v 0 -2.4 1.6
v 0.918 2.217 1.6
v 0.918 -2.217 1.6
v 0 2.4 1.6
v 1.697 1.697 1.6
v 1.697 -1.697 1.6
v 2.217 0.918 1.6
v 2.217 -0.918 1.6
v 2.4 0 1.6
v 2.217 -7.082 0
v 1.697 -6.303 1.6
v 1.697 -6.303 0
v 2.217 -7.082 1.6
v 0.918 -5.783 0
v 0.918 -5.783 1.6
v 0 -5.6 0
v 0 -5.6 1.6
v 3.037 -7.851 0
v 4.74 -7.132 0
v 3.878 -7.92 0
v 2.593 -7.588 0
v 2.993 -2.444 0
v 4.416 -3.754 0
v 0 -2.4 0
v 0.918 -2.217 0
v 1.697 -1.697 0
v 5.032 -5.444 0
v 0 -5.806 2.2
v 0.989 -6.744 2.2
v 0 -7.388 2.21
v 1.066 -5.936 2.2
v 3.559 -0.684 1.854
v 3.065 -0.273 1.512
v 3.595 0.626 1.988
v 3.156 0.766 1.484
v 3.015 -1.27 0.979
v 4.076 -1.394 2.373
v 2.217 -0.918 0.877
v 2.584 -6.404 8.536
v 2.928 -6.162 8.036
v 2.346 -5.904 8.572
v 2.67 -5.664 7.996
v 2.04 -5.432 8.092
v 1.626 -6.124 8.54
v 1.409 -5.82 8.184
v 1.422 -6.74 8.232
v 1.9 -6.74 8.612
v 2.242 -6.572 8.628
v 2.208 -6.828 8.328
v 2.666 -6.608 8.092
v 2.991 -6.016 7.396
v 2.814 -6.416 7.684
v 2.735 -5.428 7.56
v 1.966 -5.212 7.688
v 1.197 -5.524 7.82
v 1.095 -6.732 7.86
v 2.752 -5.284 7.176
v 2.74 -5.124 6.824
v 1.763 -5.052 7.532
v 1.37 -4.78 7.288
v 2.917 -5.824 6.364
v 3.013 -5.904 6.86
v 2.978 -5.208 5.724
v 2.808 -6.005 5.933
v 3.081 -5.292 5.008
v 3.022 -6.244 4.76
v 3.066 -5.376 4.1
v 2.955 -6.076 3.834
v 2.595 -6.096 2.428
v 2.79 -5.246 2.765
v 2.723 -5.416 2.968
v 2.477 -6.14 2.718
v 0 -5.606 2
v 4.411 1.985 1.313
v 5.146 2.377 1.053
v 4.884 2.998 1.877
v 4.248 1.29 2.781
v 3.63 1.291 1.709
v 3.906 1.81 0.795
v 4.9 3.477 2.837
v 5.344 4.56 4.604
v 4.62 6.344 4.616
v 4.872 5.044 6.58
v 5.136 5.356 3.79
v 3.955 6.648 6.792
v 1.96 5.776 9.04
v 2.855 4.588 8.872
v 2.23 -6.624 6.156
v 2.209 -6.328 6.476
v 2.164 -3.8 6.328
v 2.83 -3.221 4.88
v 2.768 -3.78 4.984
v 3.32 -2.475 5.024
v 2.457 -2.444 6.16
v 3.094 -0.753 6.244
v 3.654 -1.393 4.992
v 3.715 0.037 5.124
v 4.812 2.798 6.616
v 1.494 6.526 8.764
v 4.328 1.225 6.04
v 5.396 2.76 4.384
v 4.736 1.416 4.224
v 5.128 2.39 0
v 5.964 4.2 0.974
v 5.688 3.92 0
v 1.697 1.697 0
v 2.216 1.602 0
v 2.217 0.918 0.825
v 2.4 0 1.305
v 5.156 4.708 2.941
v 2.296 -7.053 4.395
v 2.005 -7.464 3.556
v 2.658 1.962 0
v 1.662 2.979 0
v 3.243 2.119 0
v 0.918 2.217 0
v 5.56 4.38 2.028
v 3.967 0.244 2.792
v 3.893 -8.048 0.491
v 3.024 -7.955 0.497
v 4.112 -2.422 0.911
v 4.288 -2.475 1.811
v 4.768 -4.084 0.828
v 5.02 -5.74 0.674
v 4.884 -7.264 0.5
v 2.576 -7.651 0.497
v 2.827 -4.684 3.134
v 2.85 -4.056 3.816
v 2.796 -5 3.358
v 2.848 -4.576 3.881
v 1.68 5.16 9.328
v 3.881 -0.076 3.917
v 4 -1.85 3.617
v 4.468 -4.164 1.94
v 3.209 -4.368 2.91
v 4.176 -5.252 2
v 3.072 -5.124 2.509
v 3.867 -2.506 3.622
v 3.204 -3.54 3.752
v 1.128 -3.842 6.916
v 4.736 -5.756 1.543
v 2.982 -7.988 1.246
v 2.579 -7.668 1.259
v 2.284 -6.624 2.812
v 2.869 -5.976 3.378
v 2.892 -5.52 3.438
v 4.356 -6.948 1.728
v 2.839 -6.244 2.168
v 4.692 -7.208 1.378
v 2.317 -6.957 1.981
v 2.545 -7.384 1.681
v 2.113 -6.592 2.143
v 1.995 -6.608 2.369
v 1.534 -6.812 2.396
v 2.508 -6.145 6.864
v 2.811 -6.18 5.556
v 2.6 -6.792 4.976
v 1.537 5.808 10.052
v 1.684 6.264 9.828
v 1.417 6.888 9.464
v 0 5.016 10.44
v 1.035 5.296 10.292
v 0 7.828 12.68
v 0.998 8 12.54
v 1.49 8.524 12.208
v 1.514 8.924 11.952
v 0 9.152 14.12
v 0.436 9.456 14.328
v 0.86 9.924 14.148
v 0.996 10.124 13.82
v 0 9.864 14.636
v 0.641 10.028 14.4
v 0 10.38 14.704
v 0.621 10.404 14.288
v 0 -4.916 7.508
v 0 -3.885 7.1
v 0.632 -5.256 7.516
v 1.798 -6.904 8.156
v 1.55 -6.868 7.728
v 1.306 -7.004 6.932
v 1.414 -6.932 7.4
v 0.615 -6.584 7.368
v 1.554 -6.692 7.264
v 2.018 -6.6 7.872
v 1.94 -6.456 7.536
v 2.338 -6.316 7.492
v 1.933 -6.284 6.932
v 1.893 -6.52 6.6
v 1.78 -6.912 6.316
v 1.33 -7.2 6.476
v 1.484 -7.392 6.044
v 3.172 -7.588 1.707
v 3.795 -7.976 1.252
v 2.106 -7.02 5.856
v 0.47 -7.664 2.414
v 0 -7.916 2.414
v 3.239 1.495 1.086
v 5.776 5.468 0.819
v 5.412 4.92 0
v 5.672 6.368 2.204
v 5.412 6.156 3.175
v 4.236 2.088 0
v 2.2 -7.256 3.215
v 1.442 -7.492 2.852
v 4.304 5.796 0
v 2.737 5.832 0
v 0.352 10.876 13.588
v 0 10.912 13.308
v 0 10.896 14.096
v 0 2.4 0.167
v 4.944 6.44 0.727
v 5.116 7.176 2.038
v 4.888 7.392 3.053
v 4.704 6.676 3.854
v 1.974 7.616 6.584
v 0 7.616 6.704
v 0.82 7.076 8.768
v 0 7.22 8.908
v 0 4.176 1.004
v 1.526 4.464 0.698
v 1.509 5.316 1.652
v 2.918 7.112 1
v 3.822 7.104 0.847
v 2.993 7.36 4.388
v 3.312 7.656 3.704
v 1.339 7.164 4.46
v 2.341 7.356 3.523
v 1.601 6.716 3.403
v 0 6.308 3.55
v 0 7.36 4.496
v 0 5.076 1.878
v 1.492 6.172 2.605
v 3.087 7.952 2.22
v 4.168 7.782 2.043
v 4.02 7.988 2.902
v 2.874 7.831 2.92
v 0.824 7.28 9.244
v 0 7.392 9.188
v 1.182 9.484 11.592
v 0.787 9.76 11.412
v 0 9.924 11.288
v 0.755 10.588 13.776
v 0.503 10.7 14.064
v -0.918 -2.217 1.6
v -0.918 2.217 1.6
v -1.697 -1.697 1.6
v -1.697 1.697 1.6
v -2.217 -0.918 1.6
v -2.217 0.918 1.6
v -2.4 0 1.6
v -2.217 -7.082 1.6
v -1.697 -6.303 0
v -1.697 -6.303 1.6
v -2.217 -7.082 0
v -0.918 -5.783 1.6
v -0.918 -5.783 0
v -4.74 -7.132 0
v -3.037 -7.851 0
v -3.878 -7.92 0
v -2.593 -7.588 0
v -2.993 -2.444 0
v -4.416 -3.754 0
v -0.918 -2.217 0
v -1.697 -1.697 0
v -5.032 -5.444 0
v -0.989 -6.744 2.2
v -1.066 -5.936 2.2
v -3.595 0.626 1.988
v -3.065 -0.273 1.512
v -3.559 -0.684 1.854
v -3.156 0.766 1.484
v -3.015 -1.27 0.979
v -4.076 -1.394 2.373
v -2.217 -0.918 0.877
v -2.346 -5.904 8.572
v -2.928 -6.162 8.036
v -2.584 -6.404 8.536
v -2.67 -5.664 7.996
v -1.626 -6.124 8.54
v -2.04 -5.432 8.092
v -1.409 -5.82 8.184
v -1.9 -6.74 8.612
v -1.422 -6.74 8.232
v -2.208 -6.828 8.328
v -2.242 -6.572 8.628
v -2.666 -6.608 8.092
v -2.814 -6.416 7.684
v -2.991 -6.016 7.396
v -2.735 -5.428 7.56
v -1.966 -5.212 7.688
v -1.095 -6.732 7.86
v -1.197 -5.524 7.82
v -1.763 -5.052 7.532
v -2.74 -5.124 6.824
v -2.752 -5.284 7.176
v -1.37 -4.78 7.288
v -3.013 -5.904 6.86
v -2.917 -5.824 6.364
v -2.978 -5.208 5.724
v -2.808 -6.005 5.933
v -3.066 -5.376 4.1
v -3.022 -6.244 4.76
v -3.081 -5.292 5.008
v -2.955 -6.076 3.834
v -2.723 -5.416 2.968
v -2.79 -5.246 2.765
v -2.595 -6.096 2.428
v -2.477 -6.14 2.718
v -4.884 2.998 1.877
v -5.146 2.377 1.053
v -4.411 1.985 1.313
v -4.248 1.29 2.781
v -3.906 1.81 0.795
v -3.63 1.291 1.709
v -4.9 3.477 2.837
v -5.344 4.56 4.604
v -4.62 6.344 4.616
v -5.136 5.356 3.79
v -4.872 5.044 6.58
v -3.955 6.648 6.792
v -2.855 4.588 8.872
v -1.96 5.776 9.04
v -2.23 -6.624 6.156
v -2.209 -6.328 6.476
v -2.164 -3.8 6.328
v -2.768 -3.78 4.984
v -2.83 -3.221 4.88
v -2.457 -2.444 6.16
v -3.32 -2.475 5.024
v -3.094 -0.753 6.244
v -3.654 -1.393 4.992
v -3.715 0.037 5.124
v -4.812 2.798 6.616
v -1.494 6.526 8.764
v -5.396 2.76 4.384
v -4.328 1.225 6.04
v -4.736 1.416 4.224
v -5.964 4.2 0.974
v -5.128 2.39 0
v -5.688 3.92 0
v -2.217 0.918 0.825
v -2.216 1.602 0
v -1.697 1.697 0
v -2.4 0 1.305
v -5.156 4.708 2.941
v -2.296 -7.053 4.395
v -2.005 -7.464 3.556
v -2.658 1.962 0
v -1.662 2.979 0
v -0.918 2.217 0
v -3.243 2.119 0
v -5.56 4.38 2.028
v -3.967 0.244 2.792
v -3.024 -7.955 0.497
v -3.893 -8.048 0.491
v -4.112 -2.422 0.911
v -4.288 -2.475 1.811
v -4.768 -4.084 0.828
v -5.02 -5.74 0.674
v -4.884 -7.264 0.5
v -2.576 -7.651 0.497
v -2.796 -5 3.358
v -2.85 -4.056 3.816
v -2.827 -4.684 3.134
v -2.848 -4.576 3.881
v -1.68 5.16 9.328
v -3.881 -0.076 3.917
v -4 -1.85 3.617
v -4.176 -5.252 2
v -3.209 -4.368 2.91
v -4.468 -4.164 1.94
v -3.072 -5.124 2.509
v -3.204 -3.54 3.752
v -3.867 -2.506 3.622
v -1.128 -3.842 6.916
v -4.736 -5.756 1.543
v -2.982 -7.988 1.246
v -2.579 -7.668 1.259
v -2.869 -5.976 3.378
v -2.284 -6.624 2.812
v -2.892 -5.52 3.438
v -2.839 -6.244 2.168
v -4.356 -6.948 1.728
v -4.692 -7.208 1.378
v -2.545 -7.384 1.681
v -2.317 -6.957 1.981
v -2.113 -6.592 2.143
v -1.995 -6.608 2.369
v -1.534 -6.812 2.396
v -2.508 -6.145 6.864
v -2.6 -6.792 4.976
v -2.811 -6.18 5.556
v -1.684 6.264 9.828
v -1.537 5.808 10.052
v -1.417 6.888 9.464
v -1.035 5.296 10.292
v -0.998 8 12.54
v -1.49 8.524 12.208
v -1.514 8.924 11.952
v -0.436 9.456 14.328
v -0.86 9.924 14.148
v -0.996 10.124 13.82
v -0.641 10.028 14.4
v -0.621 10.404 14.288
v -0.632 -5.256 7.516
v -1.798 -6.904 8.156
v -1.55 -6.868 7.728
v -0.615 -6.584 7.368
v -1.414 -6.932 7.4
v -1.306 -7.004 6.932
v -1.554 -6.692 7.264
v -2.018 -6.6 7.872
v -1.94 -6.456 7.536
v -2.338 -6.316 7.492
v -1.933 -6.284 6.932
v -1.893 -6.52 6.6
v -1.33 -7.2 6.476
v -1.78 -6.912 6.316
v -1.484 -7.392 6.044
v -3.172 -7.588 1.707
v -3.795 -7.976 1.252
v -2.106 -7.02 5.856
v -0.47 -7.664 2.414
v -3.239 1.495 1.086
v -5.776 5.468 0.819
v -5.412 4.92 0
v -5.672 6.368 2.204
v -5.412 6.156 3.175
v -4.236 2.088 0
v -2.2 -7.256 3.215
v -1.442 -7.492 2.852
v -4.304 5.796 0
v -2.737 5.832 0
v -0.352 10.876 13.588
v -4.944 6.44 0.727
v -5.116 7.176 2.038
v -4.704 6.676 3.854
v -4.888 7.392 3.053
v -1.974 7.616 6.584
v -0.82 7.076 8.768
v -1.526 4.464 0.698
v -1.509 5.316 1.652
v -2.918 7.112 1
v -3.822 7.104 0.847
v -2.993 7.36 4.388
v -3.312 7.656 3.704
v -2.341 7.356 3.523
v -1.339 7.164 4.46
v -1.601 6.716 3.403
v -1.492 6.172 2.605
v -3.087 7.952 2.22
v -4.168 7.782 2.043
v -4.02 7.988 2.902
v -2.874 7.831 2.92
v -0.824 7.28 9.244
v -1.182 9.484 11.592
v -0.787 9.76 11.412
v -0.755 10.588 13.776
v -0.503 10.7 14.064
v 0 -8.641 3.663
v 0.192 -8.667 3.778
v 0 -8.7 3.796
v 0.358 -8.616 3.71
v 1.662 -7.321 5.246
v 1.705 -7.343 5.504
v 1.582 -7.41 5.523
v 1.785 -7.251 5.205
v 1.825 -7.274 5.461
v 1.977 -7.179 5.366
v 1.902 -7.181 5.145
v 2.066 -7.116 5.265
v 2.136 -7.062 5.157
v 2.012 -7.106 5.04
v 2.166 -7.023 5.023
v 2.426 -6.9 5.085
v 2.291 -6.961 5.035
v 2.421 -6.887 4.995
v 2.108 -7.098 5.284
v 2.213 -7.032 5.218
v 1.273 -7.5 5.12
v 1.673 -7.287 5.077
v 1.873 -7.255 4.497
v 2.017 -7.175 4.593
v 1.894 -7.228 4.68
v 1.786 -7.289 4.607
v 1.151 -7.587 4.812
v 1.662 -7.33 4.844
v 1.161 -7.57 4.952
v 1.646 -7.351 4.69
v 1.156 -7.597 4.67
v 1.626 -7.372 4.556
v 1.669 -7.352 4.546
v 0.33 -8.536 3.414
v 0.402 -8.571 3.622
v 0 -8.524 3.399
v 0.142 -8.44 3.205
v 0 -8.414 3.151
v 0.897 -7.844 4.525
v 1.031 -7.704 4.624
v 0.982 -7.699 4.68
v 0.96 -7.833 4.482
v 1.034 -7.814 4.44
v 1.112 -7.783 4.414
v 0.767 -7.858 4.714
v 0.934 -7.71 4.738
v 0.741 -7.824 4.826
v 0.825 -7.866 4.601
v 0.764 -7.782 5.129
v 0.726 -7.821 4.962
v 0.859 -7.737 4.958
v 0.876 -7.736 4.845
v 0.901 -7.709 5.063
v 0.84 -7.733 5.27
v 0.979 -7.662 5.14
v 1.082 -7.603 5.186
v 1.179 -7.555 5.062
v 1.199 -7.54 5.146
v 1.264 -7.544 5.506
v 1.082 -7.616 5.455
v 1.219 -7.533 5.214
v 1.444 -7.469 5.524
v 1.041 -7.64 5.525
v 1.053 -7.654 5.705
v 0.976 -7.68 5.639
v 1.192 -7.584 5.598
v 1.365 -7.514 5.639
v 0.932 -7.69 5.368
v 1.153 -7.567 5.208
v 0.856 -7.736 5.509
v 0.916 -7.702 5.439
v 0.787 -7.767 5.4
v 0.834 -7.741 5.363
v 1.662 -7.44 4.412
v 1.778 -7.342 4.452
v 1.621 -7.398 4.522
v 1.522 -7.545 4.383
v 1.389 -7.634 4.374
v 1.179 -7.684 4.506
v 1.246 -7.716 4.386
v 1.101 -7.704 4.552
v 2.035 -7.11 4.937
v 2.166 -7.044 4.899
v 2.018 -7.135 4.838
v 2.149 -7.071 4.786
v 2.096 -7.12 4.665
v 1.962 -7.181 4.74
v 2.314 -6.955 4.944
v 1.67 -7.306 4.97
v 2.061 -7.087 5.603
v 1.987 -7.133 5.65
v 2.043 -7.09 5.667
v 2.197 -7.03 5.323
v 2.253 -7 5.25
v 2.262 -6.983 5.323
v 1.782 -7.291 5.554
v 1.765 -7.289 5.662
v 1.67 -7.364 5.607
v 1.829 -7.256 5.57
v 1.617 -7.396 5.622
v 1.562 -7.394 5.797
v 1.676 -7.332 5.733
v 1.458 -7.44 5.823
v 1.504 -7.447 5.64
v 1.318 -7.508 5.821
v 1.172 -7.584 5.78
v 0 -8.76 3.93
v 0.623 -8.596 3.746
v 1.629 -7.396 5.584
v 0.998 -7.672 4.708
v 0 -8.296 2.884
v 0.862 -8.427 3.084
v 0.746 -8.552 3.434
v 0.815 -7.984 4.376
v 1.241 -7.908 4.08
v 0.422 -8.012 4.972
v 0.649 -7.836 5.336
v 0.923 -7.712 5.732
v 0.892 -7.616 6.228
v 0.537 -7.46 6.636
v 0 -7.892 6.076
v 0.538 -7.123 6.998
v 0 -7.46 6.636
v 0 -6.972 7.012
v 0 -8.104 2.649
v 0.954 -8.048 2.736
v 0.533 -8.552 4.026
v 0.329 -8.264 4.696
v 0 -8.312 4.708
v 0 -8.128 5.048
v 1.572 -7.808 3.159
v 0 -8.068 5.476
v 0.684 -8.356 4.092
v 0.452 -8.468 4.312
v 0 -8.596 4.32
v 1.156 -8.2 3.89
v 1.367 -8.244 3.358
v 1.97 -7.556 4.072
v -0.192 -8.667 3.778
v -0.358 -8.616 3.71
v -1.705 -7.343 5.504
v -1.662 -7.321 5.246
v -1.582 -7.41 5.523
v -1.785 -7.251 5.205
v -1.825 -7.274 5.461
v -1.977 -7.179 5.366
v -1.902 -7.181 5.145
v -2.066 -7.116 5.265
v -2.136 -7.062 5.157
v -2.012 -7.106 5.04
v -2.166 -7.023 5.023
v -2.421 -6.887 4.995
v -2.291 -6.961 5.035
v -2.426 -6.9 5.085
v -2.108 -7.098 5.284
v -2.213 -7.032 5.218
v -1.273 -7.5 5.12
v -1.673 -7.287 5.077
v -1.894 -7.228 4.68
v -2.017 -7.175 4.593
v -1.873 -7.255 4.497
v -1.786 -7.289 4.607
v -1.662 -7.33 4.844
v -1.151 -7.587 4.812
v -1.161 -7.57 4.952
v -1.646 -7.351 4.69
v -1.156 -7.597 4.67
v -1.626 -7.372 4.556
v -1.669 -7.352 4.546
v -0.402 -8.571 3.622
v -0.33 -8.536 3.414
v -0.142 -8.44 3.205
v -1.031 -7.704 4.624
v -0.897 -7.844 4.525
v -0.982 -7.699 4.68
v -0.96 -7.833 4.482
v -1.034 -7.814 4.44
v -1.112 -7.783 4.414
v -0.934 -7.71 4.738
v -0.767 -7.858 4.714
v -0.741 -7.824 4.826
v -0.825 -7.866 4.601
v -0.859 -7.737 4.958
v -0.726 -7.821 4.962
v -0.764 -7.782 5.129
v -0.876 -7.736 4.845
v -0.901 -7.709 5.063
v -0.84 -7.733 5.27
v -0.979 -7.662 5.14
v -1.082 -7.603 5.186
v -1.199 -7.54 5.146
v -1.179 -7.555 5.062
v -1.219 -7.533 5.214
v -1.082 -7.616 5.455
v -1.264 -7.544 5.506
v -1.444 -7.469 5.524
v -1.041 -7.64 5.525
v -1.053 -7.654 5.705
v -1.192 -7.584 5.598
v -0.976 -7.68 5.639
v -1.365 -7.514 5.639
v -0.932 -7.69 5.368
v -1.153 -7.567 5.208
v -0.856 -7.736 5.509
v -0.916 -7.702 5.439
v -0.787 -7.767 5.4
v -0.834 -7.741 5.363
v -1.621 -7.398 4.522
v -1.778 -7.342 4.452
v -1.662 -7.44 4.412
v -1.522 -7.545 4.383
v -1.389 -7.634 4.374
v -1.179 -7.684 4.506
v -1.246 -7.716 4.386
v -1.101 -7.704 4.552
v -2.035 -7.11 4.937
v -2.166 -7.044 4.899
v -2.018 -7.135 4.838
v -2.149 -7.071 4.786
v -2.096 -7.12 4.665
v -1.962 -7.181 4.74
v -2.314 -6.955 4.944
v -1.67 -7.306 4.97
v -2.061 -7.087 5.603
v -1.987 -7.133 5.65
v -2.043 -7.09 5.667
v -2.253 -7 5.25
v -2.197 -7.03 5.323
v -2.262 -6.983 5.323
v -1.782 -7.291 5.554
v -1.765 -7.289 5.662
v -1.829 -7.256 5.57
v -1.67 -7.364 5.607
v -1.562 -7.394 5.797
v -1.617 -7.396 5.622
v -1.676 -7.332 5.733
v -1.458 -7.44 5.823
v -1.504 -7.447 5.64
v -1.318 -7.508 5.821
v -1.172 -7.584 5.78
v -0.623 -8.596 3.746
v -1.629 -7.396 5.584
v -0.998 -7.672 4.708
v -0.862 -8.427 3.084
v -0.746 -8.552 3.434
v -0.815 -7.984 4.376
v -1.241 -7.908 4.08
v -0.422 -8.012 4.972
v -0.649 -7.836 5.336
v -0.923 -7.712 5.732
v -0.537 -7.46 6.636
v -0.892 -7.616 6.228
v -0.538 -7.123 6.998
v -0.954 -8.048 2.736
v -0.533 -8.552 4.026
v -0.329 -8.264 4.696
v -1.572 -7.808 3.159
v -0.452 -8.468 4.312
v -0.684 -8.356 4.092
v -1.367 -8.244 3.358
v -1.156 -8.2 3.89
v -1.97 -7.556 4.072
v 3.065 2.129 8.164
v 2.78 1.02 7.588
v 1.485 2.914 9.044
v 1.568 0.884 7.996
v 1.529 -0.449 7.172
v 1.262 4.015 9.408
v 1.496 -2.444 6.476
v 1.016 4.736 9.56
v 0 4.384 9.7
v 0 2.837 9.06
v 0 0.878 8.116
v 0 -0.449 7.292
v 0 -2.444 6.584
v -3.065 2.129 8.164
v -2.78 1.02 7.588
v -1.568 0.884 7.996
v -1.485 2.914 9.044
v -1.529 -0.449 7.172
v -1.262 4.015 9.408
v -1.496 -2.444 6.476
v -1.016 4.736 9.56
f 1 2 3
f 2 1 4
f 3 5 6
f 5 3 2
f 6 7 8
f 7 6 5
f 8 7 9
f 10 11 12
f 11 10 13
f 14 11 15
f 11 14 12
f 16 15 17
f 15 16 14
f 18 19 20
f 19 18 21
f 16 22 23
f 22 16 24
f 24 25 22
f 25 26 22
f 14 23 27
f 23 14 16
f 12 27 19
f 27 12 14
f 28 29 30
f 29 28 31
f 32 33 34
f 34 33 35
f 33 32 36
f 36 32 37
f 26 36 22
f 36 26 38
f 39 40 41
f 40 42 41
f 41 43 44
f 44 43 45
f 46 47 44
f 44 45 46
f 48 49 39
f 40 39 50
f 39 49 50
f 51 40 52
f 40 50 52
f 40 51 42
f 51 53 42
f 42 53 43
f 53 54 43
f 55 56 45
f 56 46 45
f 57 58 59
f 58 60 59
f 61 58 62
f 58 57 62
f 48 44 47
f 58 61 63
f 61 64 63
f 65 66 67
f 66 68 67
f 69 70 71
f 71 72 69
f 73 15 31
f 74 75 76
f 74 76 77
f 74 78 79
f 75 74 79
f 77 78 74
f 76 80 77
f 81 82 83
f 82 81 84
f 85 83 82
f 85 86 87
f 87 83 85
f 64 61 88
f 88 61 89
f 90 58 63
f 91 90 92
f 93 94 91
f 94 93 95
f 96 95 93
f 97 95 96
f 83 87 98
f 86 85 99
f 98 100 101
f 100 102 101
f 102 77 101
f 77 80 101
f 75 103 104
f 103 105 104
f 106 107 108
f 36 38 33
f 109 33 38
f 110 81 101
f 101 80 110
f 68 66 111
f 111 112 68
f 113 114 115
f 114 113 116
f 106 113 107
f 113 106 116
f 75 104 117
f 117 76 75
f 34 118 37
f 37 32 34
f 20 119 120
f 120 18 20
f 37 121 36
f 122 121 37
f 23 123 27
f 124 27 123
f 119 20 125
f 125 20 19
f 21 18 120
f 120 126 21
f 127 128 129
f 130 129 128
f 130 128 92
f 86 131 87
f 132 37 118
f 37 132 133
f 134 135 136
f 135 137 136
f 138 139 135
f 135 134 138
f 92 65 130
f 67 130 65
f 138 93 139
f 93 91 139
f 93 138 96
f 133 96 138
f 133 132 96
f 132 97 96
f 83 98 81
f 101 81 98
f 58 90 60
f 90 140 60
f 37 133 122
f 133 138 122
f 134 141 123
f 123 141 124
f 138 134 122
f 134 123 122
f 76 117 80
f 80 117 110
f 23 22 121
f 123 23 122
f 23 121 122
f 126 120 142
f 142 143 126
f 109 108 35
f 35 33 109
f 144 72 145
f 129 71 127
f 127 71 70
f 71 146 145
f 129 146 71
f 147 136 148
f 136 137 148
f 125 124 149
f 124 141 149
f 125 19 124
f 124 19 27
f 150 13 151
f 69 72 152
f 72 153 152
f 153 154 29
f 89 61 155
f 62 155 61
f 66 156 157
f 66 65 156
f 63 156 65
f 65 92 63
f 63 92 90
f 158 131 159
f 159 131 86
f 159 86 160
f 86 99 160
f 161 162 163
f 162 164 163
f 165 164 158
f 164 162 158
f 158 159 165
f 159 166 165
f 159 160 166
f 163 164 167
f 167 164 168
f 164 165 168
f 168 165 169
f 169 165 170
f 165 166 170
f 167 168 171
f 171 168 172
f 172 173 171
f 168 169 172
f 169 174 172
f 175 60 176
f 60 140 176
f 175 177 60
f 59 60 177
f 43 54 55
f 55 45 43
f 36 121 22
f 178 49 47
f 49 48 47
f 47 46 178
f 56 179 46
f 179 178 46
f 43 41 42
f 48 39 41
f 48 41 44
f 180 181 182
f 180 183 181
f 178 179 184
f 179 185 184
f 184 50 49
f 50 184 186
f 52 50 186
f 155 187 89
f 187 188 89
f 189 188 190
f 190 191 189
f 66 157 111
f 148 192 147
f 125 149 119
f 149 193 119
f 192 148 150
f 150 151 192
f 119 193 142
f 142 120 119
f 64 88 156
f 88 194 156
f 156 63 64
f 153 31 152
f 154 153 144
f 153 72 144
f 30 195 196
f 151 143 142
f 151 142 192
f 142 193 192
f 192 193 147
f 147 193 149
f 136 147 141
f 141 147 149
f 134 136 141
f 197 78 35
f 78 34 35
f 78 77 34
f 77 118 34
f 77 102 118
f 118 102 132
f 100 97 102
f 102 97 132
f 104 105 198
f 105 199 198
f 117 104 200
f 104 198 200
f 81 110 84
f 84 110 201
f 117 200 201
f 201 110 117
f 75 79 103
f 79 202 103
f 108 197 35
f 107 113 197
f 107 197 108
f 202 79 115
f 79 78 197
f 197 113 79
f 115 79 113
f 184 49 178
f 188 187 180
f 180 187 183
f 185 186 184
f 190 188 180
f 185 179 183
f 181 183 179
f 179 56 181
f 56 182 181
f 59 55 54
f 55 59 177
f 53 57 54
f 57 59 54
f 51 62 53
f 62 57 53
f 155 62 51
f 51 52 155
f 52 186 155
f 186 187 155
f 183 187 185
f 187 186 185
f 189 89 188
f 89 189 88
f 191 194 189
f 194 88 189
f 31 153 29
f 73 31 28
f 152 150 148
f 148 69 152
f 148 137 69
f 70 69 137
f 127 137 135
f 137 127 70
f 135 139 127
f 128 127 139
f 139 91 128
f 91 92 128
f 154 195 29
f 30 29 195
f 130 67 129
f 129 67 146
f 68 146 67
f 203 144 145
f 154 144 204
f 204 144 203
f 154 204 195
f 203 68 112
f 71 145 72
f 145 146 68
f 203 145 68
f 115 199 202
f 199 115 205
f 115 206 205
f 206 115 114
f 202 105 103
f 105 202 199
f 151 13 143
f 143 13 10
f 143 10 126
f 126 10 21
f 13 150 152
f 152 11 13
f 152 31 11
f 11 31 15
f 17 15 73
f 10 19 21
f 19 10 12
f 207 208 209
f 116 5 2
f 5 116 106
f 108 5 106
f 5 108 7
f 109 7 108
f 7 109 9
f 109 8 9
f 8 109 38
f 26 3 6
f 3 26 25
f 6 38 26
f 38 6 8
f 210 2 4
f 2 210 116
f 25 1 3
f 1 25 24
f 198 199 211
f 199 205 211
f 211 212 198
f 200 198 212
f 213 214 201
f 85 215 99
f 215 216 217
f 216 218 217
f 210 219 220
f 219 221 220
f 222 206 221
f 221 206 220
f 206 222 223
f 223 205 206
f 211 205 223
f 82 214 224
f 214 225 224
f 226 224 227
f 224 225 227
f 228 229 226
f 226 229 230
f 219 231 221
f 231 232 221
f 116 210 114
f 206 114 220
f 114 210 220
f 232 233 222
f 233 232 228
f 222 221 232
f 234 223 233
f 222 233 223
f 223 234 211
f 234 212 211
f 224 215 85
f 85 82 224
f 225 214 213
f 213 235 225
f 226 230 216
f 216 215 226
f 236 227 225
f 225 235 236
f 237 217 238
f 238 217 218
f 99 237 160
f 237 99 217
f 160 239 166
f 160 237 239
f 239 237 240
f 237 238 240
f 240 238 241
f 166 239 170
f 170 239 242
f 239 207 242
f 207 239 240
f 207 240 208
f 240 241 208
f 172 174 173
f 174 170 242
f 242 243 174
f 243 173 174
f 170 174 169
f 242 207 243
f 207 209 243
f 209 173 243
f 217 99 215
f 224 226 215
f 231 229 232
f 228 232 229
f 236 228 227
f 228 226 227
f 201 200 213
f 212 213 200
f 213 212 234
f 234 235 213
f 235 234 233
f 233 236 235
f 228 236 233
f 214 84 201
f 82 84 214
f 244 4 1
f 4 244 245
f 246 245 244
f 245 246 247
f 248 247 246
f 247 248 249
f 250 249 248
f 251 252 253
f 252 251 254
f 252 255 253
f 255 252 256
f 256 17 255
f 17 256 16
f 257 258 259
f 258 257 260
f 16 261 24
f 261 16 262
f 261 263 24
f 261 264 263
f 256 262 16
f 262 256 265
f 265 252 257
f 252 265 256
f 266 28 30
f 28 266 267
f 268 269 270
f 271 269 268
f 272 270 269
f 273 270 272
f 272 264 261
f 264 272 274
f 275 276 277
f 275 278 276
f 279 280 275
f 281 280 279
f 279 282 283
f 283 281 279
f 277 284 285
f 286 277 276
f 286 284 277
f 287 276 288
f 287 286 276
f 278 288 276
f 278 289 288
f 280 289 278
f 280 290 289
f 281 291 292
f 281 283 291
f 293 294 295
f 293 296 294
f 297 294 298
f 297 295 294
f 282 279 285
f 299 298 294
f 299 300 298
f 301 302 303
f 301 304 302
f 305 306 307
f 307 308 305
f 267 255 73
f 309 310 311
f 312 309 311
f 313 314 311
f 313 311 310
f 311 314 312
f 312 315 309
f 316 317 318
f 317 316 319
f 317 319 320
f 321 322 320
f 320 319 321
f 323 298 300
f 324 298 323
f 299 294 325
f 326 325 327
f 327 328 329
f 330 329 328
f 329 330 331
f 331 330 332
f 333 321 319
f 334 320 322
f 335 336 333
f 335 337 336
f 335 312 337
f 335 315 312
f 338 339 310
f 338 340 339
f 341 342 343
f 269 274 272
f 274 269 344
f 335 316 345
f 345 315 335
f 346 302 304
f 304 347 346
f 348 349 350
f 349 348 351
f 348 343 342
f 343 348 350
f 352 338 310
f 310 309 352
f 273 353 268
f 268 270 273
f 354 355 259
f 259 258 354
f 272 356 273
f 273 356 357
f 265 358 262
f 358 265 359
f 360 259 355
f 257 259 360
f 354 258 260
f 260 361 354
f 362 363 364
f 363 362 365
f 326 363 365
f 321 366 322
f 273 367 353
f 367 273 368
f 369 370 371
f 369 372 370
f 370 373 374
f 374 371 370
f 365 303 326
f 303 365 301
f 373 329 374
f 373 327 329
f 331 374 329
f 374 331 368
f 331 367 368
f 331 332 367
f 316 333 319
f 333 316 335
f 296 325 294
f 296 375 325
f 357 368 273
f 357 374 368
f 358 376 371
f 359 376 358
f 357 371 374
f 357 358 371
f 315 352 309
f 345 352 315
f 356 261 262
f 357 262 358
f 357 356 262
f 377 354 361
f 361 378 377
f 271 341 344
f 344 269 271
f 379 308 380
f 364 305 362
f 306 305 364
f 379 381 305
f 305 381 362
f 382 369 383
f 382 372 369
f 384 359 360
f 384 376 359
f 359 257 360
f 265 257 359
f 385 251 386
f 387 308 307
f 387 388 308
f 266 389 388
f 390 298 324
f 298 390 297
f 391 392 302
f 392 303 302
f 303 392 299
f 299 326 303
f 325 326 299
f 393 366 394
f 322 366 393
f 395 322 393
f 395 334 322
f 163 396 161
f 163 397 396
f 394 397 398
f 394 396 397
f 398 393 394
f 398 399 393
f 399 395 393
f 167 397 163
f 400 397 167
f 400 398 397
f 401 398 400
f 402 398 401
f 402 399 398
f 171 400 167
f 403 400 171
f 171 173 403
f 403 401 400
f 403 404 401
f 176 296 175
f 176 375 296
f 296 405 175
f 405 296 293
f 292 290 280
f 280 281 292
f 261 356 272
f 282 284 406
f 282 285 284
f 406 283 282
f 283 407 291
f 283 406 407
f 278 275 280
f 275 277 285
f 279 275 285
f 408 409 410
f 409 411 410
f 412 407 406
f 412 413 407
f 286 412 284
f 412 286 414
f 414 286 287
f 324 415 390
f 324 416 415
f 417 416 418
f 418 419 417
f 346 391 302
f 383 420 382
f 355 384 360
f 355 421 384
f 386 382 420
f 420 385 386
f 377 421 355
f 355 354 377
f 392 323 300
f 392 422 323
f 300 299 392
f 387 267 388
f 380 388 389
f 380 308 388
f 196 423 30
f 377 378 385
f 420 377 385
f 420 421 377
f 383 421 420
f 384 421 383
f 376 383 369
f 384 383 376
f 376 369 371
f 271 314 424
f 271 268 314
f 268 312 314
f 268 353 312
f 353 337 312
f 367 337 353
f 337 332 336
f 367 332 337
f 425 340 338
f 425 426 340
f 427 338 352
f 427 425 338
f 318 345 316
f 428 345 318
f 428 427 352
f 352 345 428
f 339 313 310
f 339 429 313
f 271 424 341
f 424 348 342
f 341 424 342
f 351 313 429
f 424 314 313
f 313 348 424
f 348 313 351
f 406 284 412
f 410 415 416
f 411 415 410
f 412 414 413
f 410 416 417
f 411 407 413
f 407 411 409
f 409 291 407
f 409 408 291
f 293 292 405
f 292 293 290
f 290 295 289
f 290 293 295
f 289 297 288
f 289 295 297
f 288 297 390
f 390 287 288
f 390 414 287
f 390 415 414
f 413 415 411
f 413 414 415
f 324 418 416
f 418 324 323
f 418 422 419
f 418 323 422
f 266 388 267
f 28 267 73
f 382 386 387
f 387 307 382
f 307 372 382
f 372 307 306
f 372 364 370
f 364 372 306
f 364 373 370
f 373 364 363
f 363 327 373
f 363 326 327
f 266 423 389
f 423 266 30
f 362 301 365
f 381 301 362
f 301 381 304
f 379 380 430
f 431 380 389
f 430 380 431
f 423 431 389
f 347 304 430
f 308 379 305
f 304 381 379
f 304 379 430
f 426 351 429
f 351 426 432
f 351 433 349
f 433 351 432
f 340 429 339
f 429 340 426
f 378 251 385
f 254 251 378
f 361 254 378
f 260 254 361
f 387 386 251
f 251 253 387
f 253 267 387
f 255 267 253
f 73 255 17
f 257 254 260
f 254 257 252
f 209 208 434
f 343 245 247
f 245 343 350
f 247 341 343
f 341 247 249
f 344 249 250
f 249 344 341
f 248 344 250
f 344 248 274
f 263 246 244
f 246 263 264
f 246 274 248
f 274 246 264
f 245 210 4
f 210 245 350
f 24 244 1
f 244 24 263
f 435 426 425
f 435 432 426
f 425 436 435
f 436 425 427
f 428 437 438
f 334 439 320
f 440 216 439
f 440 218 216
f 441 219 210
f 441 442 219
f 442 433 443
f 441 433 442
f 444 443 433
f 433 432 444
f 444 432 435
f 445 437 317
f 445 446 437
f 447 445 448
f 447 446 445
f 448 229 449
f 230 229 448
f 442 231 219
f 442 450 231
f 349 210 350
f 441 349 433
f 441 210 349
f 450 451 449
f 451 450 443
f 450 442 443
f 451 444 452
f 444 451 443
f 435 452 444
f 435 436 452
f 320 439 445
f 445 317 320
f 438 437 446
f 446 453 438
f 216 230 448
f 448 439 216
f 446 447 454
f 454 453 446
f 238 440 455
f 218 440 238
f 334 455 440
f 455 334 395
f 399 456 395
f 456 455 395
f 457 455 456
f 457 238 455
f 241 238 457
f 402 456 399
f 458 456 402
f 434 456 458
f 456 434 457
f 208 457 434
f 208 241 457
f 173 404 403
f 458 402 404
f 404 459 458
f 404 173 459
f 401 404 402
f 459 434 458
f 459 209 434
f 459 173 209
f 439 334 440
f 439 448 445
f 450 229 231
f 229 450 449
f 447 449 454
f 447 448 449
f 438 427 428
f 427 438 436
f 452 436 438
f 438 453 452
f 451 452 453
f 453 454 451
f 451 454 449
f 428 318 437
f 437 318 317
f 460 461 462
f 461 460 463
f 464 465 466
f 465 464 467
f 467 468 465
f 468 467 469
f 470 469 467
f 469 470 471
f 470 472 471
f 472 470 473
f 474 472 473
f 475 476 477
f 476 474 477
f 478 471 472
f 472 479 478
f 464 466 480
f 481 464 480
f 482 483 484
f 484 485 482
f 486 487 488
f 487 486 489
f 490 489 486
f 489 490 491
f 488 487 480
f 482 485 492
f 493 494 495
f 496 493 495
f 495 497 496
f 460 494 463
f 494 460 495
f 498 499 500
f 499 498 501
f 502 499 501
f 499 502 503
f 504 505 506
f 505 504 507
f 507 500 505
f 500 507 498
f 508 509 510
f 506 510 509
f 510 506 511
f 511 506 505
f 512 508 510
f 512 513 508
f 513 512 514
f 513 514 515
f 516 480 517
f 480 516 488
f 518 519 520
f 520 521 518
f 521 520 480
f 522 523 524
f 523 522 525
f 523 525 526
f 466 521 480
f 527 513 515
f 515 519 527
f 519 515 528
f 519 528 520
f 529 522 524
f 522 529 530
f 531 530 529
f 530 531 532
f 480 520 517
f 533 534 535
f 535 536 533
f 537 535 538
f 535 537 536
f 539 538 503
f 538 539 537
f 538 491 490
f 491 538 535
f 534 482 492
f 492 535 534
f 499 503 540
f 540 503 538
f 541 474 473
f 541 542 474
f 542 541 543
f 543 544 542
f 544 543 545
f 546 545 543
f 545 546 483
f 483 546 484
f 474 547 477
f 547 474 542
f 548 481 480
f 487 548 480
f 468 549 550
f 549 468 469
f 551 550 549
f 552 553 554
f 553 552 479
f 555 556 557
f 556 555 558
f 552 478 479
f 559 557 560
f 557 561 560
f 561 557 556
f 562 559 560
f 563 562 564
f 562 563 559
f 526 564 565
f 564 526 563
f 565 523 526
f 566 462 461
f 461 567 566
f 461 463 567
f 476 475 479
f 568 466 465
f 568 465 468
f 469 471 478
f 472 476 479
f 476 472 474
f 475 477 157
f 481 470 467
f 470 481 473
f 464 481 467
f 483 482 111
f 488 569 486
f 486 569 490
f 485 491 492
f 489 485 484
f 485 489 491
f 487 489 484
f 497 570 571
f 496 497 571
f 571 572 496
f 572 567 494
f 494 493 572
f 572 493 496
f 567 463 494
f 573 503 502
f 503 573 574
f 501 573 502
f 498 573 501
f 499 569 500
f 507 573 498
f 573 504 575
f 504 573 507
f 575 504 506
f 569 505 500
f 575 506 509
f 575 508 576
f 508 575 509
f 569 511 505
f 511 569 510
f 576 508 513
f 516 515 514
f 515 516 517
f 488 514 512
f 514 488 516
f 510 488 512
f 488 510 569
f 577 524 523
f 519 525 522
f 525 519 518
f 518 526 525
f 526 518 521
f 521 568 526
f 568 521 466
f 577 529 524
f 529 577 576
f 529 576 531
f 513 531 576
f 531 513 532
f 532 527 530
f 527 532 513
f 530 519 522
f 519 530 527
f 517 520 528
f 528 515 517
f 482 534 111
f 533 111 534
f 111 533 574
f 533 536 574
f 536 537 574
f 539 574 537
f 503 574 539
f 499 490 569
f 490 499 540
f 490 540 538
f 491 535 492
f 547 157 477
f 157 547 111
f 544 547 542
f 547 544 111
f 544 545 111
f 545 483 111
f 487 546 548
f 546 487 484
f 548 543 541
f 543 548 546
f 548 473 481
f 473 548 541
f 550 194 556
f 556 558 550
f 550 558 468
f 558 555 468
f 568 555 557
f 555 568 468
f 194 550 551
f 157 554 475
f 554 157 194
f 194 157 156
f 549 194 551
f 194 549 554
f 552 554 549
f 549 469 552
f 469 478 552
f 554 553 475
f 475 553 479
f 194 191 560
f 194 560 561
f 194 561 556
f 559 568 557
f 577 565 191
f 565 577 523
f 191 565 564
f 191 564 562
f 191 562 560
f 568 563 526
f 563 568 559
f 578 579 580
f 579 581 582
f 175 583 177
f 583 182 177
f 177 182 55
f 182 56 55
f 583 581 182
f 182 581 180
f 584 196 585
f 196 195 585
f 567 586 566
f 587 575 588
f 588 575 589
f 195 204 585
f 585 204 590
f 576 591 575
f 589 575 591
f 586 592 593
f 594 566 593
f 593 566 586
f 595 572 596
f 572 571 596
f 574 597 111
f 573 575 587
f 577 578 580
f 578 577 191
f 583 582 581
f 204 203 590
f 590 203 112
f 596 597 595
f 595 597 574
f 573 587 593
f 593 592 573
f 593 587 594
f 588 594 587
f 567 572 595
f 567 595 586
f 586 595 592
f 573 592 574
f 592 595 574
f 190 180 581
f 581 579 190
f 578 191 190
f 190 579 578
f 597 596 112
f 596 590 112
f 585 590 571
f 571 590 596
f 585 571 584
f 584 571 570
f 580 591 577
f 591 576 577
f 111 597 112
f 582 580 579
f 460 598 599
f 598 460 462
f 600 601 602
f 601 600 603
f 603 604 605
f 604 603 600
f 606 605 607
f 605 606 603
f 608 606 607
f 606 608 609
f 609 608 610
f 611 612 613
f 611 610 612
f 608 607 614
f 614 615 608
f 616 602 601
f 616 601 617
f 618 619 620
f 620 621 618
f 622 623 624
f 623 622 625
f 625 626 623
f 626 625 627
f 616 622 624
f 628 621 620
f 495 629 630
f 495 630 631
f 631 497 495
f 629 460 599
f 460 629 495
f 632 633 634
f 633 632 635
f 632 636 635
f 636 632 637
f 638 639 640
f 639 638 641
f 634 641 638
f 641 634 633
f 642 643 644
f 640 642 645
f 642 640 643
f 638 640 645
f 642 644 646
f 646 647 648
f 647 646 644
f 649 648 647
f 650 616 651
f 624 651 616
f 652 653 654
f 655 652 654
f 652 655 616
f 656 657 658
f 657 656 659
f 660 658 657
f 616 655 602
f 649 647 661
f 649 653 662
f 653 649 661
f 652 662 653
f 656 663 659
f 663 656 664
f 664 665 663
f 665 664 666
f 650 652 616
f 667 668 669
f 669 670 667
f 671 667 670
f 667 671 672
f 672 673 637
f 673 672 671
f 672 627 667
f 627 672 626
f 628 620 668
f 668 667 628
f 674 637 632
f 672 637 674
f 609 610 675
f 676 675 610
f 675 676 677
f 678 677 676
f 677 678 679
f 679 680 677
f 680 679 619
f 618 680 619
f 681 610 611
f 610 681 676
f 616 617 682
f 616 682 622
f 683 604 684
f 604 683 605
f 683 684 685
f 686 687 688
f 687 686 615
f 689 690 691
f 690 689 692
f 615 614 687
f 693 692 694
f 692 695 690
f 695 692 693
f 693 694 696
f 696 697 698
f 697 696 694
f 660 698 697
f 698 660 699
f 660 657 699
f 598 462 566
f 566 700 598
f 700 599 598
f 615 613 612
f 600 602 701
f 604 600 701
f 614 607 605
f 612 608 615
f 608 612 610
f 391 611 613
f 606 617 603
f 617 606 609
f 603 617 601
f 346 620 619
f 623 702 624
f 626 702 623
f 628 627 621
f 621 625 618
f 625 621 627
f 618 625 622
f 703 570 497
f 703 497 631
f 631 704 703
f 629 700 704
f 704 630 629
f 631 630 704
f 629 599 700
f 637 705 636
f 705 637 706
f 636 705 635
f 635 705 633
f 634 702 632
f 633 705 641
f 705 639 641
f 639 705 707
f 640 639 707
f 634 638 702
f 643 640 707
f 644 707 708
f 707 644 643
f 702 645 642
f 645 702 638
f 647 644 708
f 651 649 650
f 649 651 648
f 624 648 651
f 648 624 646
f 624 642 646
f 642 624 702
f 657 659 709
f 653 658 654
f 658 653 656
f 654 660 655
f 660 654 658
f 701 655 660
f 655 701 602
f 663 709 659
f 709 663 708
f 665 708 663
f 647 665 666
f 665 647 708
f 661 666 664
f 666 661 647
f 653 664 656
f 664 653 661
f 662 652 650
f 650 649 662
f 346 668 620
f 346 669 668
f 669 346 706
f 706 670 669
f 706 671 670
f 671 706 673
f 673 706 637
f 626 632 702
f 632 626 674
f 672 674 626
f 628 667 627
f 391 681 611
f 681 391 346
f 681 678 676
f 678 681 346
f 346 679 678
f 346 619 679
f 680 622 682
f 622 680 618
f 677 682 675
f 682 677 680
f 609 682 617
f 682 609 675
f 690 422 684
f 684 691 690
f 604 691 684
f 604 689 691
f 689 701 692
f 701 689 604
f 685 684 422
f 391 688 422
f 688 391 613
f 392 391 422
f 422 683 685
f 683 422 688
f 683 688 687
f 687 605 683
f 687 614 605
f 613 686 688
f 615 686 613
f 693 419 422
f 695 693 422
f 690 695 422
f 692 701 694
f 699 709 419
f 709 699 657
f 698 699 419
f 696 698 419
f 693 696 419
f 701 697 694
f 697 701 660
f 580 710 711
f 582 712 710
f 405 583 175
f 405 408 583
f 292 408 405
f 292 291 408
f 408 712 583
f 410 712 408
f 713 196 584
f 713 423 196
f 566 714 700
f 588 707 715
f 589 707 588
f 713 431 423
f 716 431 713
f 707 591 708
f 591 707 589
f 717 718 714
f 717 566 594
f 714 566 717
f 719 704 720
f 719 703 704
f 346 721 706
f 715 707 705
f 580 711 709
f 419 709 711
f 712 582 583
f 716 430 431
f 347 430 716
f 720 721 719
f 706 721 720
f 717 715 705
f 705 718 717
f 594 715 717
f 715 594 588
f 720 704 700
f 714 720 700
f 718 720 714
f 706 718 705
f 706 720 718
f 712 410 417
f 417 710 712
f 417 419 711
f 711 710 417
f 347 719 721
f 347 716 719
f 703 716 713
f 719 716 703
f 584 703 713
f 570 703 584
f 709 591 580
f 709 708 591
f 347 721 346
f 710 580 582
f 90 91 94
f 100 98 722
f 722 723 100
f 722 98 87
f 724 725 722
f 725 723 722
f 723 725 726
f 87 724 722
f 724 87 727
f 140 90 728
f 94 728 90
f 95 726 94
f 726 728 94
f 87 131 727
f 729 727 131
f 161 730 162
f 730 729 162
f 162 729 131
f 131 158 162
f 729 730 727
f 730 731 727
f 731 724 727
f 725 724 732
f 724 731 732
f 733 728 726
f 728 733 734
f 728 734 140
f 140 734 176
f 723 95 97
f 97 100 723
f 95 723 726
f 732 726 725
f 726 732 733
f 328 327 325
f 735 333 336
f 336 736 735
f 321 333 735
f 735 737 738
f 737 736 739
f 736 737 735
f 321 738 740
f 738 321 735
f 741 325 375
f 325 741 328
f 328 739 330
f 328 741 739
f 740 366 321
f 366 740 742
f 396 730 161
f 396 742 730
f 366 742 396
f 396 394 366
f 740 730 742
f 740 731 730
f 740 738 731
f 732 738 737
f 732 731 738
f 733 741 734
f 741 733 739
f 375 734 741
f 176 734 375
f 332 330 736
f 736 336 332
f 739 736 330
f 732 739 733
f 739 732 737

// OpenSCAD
use <../lib.scad>
use <s/6251p02s01.scad>
use <s/6251s01.scad>
use <s/6251s03.scad>
function ldraw_lib__6251p02() = [
// 0 Animal Cat Crouching with Black Eyes, Eyelashes, Eyebrows and Nose Pattern
// 0 Name: 6251p02.dat
// 0 Author: Willy Tschager [Holly-Wood]
// 0 !LDRAW_ORG Part UPDATE 2022-06
// 0 !LICENSE Licensed under CC BY 2.0 and CC BY 4.0 : see CAreadme.txt
// 
// 0 BFC CERTIFY CW
  [0,"BFC","CERTIFY"],
  [0,"BFC","CW"],
// 
// 0 !KEYWORDS Belville, Bricklink 6251px1, creature, mousetrap, pet, set 10173
// 0 !KEYWORDS set 10185, Set 10199, set 5944
// 
// 0 !HISTORY 2022-12-20 [PTadmin] Official Update 2022-06
// 
// 
// 0 // Half without Patternable Area
// 
// 1 16 0 0 0 1 0 0 0 1 0 0 0 1 s\6251s01.dat
  [1,16,0,0,0,1,0,0,0,1,0,0,0,1, ldraw_lib__s__6251s01()],
// 1 16 0 0 0 -1 0 0 0 1 0 0 0 1 s\6251s01.dat
  [1,16,0,0,0,-1,0,0,0,1,0,0,0,1, ldraw_lib__s__6251s01()],
// 
// 0 // Patternable Area
// 1 16 0 0 0 1 0 0 0 1 0 0 0 1 s\6251p02s01.dat
  [1,16,0,0,0,1,0,0,0,1,0,0,0,1, ldraw_lib__s__6251p02s01()],
// 1 16 0 0 0 -1 0 0 0 1 0 0 0 1 s\6251p02s01.dat
  [1,16,0,0,0,-1,0,0,0,1,0,0,0,1, ldraw_lib__s__6251p02s01()],
// 
// 0 // Patternable Area Back
// 1 16 0 0 0 1 0 0 0 1 0 0 0 1 s\6251s03.dat
  [1,16,0,0,0,1,0,0,0,1,0,0,0,1, ldraw_lib__s__6251s03()],
// 1 16 0 0 0 -1 0 0 0 1 0 0 0 1 s\6251s03.dat
  [1,16,0,0,0,-1,0,0,0,1,0,0,0,1, ldraw_lib__s__6251s03()],
];
makepoly(ldraw_lib__6251p02(), line=0.2);
